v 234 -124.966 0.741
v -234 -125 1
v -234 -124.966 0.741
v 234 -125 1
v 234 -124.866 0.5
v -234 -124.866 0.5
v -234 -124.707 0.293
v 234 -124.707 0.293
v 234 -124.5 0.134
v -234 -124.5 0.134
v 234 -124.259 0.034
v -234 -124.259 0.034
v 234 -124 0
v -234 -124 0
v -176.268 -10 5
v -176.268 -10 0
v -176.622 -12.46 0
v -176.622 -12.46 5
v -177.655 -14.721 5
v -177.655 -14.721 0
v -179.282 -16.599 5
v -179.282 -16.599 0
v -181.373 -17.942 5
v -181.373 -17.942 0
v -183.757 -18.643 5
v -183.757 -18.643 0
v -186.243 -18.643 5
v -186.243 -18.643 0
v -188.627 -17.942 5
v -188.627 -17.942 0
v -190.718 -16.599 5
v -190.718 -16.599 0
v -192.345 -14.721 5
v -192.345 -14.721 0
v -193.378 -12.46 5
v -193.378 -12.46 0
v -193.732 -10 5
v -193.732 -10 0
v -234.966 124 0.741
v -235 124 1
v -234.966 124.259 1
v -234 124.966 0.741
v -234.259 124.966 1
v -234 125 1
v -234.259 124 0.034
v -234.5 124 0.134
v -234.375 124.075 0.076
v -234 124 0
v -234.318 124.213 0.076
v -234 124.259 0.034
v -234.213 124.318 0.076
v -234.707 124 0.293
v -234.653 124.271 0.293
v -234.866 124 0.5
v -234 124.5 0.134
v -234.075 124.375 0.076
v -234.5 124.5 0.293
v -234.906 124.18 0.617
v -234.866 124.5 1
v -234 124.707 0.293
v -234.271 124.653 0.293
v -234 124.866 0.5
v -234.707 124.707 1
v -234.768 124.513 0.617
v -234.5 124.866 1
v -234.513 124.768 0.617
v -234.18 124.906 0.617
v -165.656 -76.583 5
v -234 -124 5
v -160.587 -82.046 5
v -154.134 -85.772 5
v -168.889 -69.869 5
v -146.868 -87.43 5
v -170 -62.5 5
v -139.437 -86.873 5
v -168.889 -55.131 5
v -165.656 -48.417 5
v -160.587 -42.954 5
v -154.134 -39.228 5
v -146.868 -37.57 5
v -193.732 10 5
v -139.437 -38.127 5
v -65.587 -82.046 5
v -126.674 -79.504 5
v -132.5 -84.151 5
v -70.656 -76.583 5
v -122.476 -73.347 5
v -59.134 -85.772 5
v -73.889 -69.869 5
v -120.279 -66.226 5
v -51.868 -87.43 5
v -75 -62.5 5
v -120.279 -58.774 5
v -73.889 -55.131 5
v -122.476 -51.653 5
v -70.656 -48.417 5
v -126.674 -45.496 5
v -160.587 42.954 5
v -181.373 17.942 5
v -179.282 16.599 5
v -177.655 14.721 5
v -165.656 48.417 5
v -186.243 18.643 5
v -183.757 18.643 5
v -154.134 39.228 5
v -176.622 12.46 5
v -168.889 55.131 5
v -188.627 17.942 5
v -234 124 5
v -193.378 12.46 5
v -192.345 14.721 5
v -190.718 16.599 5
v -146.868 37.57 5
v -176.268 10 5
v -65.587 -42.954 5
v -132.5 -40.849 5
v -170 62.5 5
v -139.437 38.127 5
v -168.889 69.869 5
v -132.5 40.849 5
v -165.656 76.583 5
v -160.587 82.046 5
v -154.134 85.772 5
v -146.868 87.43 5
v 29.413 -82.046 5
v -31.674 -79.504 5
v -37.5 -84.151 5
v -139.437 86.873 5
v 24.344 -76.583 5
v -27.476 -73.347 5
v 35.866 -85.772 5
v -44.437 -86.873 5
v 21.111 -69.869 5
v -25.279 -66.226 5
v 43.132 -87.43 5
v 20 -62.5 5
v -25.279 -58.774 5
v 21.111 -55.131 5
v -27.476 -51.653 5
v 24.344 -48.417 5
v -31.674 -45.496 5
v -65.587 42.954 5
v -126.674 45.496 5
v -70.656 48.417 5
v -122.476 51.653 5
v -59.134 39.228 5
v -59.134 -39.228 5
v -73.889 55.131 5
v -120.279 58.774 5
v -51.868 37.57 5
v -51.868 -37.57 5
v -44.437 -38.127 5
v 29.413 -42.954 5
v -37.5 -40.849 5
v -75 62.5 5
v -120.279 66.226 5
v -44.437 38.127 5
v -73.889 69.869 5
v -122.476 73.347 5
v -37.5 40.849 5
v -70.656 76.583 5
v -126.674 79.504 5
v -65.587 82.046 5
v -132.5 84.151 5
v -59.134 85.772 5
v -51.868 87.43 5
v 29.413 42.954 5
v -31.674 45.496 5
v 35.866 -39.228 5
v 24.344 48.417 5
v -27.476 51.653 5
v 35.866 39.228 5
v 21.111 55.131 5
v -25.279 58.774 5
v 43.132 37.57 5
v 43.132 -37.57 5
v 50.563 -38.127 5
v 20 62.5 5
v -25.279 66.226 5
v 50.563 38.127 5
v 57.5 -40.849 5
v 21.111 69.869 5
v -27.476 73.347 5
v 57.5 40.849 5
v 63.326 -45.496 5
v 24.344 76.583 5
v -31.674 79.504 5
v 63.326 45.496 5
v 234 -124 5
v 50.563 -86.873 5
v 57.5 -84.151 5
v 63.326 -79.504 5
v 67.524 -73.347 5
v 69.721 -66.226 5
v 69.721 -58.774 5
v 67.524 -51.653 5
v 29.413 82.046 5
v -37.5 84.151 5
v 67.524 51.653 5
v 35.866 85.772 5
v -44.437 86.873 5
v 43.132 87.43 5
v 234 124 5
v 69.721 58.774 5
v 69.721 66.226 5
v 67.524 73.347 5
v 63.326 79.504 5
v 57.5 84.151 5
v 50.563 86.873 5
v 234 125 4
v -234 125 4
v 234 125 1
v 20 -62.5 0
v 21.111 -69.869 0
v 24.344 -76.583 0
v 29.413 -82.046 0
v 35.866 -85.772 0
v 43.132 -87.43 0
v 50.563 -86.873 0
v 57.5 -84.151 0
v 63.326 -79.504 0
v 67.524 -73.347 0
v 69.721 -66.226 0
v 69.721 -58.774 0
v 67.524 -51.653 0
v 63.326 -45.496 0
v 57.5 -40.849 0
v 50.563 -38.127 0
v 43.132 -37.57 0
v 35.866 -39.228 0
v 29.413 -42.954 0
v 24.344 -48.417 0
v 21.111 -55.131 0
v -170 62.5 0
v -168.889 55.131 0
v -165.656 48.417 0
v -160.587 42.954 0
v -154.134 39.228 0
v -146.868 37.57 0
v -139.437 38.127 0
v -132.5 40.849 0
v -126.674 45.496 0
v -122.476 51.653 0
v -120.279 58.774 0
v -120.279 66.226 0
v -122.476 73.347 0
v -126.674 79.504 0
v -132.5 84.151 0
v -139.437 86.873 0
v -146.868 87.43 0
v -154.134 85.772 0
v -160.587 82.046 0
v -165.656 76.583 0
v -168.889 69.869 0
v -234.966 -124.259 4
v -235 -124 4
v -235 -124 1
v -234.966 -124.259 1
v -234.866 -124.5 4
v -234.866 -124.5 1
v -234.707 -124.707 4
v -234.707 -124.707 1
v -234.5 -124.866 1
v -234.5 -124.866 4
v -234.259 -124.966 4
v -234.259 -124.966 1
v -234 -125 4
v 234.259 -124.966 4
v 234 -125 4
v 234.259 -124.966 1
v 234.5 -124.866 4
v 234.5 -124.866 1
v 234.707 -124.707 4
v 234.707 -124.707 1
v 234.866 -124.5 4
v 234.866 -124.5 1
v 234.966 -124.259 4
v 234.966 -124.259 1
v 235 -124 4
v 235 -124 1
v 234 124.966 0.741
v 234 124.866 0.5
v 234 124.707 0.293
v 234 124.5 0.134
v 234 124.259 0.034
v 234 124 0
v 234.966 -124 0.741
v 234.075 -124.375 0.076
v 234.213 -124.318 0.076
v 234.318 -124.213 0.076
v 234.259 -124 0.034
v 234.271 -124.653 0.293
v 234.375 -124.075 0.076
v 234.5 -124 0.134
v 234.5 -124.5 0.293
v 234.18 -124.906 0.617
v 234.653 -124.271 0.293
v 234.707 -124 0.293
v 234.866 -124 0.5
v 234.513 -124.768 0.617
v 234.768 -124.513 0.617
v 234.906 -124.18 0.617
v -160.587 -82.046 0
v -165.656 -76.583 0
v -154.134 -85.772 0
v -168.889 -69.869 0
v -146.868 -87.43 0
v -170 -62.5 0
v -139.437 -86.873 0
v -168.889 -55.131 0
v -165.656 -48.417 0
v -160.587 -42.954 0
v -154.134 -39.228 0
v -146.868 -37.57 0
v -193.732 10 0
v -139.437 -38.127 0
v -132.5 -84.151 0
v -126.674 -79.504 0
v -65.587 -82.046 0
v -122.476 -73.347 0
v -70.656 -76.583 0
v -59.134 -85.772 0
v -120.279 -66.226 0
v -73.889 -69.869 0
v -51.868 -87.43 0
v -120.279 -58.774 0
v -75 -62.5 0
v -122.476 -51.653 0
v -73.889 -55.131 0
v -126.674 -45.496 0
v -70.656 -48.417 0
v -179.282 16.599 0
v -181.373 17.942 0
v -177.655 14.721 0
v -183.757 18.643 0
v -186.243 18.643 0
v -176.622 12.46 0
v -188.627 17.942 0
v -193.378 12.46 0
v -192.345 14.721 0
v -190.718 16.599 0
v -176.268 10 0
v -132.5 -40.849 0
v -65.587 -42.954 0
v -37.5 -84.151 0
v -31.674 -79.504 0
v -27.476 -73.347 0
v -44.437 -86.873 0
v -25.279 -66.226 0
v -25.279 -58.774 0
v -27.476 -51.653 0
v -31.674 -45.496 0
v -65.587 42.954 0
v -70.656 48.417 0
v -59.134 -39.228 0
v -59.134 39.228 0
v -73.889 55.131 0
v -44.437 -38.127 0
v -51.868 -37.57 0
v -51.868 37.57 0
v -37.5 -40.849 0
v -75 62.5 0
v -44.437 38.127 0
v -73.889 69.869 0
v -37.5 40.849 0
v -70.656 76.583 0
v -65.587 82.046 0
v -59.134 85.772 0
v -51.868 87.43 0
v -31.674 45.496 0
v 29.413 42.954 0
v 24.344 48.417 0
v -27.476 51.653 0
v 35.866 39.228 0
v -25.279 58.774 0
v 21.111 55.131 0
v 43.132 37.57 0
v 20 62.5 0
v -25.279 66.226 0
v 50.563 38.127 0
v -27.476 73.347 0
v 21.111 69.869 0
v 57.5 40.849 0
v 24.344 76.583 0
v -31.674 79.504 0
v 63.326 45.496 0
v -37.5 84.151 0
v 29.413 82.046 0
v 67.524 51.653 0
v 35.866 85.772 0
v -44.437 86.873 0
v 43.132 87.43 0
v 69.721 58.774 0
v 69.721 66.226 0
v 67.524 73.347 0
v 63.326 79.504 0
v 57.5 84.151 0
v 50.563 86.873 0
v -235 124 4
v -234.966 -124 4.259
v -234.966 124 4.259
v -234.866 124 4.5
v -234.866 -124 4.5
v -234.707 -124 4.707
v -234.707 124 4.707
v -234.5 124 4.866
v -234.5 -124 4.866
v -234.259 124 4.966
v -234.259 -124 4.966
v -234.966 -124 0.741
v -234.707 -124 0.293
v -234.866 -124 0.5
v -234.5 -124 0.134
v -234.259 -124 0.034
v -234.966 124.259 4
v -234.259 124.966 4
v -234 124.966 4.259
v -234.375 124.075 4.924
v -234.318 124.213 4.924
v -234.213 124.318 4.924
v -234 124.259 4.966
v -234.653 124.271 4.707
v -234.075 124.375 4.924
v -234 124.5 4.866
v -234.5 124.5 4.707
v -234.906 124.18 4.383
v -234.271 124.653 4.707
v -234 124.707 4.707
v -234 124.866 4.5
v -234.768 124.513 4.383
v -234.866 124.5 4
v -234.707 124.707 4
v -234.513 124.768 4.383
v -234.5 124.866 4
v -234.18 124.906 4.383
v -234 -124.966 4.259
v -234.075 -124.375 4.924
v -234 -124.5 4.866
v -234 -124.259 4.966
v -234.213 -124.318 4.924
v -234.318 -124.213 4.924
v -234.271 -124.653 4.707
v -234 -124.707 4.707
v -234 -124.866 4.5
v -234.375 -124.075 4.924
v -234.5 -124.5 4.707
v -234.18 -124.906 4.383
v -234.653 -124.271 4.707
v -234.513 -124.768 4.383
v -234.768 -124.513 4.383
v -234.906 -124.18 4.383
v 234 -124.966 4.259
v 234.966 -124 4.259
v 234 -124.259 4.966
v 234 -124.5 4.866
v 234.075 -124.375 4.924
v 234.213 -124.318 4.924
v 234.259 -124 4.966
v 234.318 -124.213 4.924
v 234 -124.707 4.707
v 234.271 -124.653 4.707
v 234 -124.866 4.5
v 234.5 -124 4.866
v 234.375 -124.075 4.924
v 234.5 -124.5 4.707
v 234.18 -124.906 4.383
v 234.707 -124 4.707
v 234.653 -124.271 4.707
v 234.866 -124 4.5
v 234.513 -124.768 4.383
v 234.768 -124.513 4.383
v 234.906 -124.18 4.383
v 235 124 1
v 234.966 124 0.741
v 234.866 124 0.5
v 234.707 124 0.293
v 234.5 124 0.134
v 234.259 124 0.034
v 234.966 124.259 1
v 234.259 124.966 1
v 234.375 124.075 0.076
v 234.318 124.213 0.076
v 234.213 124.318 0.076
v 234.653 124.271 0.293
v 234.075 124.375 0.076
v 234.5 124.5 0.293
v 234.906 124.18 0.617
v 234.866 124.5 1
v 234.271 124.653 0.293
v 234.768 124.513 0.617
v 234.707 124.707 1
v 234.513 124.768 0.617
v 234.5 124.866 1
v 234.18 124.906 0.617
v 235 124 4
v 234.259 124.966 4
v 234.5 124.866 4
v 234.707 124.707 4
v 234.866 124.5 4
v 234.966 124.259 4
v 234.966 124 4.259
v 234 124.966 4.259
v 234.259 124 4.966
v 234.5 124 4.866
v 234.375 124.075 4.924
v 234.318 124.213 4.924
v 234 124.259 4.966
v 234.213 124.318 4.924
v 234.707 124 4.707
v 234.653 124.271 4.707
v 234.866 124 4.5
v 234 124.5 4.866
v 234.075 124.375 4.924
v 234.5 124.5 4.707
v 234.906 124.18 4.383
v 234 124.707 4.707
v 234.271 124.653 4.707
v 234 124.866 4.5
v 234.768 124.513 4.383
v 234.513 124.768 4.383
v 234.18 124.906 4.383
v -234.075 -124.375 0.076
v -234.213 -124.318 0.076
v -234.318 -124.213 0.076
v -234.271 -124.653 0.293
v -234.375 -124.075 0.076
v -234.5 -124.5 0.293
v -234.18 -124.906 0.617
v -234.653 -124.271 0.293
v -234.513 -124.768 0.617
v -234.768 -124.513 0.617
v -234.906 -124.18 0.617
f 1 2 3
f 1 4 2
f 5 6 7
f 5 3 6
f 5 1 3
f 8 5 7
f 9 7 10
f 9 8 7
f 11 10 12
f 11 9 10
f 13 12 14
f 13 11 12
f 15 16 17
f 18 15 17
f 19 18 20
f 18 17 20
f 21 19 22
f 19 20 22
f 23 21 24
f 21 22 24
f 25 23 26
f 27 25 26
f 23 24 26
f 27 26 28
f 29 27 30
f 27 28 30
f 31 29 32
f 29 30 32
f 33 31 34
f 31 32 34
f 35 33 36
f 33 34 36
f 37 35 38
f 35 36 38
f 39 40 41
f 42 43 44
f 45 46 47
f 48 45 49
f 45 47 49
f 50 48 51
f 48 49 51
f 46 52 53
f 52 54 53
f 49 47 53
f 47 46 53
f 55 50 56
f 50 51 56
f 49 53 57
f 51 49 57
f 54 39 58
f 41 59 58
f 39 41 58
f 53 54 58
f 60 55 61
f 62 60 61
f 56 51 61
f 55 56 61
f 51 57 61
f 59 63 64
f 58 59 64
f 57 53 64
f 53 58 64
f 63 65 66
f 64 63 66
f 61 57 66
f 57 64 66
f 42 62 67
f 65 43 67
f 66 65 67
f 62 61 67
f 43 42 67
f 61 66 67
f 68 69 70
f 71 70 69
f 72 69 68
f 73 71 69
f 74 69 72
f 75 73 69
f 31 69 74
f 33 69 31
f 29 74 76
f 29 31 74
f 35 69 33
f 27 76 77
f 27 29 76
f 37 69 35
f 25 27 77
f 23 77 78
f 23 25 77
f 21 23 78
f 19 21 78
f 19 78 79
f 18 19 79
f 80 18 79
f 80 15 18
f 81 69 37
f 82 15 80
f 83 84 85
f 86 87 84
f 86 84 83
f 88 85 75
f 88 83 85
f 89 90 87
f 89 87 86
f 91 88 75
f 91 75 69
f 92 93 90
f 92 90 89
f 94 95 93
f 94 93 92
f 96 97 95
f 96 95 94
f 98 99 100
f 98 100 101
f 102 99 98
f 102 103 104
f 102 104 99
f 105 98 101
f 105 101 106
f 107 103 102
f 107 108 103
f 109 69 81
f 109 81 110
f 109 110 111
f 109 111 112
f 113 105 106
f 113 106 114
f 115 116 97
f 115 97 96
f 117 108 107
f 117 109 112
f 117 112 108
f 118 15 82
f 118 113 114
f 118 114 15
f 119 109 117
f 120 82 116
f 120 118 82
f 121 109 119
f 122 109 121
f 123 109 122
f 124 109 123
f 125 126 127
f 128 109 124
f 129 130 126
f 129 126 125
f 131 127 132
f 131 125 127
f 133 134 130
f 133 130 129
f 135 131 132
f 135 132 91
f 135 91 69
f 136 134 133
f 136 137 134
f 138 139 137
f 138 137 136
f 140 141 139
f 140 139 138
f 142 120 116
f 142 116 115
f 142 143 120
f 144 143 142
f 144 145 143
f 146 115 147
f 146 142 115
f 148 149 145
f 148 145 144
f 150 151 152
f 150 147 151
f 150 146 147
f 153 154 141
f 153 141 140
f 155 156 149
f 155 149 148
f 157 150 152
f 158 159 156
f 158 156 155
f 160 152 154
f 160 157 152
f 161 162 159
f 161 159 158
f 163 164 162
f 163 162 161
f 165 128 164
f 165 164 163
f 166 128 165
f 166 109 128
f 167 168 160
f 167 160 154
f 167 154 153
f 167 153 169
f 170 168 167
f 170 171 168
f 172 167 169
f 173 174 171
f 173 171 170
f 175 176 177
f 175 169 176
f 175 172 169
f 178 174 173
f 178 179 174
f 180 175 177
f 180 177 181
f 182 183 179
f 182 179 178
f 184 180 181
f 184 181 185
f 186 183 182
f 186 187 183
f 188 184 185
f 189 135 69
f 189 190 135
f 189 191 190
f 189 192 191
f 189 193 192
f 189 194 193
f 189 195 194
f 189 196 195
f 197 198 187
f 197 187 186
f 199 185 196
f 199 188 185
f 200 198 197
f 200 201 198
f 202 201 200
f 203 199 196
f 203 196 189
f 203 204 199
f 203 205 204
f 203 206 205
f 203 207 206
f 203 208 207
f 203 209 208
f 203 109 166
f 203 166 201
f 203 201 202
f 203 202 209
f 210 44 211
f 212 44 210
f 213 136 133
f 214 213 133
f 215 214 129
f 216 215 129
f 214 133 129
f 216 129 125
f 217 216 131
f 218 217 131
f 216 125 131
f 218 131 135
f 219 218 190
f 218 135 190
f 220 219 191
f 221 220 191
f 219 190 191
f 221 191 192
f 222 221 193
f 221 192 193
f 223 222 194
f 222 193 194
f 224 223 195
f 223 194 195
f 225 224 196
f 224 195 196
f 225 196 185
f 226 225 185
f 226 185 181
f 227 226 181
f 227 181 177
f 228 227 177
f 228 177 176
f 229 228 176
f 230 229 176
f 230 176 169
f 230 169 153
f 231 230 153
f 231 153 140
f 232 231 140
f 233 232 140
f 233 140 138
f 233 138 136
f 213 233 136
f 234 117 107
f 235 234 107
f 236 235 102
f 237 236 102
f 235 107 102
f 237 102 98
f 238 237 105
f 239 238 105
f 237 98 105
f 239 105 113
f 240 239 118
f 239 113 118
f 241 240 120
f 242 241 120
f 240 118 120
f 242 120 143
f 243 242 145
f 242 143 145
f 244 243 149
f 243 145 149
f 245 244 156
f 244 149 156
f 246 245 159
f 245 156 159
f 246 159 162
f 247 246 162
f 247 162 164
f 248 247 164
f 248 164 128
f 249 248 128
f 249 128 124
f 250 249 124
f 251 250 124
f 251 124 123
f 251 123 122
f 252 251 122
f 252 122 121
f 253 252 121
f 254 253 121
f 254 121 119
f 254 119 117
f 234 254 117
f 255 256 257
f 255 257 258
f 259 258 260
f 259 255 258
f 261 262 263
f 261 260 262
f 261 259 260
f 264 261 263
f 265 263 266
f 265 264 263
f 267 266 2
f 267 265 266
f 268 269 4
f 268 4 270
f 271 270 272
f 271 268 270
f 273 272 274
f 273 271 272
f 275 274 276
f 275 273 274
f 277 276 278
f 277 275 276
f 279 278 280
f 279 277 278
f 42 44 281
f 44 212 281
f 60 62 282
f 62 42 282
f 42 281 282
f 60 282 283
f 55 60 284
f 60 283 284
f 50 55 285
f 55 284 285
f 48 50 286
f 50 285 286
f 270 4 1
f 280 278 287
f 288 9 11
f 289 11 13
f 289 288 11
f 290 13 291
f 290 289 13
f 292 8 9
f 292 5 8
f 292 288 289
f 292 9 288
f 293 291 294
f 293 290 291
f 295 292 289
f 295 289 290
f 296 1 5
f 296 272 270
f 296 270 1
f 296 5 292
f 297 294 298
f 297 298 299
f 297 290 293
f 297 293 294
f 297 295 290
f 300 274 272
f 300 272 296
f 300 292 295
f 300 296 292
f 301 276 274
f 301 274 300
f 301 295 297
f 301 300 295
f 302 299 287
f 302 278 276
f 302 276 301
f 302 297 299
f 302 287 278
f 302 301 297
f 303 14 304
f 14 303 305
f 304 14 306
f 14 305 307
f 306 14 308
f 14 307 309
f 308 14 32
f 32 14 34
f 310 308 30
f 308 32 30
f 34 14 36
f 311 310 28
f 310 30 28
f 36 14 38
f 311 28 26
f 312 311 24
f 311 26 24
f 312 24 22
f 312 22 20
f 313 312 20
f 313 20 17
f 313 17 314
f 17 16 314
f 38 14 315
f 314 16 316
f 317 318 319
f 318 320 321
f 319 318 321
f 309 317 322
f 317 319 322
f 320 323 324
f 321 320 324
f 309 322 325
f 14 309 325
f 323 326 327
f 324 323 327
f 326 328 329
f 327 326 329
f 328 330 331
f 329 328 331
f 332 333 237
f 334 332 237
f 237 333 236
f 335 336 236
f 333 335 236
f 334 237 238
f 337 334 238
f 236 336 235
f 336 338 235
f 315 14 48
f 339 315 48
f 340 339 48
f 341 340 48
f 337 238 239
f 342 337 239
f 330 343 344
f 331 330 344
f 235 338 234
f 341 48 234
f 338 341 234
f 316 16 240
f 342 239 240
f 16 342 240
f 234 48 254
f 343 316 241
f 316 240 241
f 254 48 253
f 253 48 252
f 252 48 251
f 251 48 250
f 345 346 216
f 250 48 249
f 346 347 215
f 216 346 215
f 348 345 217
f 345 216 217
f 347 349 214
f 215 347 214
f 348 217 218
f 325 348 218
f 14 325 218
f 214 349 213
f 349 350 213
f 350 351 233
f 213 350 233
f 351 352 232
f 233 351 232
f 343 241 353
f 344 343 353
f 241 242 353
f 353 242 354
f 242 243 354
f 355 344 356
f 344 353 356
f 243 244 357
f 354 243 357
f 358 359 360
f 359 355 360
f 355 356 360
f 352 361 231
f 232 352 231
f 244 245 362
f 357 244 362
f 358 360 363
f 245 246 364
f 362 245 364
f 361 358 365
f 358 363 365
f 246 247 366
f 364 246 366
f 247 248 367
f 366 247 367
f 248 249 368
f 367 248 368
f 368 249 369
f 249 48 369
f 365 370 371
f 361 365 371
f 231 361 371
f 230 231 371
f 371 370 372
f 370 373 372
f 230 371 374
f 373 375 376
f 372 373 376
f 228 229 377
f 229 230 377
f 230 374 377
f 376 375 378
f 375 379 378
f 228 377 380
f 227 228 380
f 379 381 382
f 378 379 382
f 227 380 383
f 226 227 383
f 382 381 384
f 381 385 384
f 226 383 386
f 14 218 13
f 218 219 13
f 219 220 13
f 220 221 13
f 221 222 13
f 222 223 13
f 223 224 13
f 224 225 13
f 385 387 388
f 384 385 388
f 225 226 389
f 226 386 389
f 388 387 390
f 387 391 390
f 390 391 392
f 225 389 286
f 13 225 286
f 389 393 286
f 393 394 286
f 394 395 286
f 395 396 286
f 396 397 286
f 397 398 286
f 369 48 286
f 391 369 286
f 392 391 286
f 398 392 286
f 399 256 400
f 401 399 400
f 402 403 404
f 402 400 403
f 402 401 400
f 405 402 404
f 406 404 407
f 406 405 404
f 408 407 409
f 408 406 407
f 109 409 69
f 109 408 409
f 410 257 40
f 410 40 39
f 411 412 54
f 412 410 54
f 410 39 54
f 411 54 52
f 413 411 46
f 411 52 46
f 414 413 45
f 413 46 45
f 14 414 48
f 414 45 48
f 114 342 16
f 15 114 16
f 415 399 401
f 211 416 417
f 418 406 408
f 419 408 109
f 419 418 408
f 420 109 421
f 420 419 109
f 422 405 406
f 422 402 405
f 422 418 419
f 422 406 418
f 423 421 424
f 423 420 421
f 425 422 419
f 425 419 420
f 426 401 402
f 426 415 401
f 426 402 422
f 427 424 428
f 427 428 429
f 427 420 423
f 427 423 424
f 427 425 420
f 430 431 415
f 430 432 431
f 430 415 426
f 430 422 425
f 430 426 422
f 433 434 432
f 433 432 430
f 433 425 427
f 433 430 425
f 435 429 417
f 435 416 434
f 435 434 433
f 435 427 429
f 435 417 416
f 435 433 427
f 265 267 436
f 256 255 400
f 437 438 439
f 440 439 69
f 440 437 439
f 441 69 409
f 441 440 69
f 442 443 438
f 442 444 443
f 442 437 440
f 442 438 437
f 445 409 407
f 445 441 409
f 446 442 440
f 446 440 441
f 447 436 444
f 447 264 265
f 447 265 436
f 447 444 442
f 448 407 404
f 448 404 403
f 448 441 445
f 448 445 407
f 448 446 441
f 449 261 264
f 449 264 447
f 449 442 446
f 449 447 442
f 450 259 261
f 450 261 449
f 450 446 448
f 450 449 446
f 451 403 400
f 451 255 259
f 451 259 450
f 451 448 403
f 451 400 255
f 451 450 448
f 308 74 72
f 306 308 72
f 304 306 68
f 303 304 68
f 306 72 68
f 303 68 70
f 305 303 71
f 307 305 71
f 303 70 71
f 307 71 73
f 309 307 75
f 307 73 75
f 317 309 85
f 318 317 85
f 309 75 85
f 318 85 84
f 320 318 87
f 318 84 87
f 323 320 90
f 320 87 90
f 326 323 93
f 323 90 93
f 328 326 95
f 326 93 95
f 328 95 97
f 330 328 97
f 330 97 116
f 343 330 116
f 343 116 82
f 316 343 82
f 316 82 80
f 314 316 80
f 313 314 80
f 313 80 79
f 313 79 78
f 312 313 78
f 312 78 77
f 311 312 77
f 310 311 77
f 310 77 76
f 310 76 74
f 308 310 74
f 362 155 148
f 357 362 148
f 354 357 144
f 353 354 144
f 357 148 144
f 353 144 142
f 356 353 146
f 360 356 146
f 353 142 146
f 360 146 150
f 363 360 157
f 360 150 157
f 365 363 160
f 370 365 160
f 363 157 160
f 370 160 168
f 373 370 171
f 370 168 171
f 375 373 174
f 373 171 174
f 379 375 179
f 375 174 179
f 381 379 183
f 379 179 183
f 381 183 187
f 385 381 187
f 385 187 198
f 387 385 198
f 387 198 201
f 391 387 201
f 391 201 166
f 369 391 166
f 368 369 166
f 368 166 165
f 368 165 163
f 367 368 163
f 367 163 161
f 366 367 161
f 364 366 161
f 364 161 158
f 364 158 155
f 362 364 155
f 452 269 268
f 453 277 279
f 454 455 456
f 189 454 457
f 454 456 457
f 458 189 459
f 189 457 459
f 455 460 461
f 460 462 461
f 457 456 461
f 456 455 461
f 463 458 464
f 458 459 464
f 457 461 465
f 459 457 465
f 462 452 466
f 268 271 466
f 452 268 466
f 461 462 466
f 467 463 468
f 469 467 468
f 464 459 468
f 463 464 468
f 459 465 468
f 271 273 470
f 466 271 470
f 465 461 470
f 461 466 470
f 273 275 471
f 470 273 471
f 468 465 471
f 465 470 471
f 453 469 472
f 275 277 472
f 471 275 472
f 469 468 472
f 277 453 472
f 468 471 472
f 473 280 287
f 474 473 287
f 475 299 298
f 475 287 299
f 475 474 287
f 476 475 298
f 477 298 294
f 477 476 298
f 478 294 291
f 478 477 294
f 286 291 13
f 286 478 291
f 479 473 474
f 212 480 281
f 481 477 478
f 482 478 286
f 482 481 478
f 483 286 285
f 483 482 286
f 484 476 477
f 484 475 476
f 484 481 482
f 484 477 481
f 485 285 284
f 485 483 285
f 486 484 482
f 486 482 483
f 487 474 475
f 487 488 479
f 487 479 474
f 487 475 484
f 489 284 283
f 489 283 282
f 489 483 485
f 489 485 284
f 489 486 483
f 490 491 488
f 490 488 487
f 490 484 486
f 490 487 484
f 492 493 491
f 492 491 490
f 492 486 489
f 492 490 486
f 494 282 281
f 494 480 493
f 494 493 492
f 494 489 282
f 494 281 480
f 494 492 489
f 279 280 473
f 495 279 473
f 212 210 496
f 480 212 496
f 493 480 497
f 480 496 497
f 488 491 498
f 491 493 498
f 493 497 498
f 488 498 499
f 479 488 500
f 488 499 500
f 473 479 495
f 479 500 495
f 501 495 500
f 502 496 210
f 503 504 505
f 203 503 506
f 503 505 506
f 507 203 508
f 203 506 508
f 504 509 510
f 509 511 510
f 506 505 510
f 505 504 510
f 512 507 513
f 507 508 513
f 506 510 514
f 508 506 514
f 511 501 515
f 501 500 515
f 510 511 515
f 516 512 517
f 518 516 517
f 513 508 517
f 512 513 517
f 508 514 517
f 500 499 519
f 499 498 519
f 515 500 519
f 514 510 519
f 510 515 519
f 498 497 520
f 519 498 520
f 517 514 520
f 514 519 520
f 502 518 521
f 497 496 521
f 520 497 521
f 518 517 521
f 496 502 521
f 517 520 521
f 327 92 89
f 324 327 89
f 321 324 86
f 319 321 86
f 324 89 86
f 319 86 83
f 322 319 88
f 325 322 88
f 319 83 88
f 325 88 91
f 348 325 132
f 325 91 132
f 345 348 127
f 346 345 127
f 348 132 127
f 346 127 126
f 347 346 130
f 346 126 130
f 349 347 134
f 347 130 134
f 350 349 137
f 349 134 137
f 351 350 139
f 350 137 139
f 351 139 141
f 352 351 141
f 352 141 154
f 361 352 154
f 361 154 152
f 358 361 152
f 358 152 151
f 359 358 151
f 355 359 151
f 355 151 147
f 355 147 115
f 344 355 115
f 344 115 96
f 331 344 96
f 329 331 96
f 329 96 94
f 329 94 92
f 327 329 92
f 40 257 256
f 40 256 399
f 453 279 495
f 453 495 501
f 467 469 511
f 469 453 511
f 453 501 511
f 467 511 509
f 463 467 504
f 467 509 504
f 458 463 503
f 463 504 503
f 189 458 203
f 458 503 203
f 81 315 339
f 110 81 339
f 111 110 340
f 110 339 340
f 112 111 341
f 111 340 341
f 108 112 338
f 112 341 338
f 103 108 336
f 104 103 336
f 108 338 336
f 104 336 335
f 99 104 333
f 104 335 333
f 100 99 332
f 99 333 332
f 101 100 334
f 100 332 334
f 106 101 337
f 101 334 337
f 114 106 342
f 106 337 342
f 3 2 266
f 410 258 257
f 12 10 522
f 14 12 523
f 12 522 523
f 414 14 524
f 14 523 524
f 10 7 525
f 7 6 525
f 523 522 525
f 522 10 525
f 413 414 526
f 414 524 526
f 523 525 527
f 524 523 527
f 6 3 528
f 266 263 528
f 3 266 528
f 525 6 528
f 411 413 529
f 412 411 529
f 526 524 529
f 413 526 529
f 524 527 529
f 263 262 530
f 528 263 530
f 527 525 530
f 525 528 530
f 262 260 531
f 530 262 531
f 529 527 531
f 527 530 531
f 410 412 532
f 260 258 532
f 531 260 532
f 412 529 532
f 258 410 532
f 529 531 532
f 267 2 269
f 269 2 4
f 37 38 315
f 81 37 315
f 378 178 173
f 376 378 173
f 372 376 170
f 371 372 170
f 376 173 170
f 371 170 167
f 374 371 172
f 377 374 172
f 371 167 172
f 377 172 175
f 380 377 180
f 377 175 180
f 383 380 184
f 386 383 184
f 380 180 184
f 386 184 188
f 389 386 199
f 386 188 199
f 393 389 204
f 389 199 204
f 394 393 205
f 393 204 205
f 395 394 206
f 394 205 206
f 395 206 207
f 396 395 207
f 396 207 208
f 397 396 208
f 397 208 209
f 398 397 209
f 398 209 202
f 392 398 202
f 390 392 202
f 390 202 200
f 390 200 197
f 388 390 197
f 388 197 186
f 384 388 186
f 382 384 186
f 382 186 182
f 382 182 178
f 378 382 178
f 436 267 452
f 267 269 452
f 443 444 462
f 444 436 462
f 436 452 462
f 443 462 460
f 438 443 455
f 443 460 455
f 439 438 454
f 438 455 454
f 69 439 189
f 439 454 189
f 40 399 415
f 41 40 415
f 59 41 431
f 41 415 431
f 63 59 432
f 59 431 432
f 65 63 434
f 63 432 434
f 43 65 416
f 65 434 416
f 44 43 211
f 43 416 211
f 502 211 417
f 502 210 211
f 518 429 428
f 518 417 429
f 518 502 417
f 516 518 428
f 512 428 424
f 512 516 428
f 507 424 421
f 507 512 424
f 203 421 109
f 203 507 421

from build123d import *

# Parameters (mm, degrees)
F0_W     = 470
F0_H     = 250
F1_DEPTH = 5
F2_R     = 1
F3_D     = 50


with BuildPart() as f1:
    # F0 (on Top) → F1 (new body)
    with BuildSketch(Plane.XY):
        Rectangle(F0_W, F0_H)
        with BuildLine():
            ThreePointArc((-193.731551, 10), (-185, 18.731551), (-176.268449, 10))
            Line((-176.268449, 10), (-176.268449, -10))
            ThreePointArc((-176.268449, -10), (-185, -18.731551), (-193.731551, -10))
            Line((-193.731551, -10), (-193.731551, 10))
        make_face(mode=Mode.SUBTRACT)
    extrude(amount=F1_DEPTH)

    # F2
    f2_edges = [f1.edges().sort_by_distance(p)[0] for p in [
        (-235, -125, 2.5),
        (235, -125, 2.5),
        (0, -125, 0),
        (0, -125, 5),
        (235, 125, 2.5),
        (235, 0, 0),
        (235, 0, 5),
        (-235, 125, 2.5),
        (-235, 0, 0),
        (-235, 0, 5),
        (0, 125, 0),
        (0, 125, 5),
    ]]
    fillet(f2_edges, radius=F2_R)

    # F3 (through all)
    with Locations(Plane(origin=(0, 0, 0), x_dir=(1, 0, 0), z_dir=(0, 0, -1))):
        with Locations((-145, 62.5), (-145, -62.5), (-50, -62.5), (-50, 62.5), (45, 62.5), (45, -62.5)):
            Hole(F3_D / 2)


solid = f1.part
